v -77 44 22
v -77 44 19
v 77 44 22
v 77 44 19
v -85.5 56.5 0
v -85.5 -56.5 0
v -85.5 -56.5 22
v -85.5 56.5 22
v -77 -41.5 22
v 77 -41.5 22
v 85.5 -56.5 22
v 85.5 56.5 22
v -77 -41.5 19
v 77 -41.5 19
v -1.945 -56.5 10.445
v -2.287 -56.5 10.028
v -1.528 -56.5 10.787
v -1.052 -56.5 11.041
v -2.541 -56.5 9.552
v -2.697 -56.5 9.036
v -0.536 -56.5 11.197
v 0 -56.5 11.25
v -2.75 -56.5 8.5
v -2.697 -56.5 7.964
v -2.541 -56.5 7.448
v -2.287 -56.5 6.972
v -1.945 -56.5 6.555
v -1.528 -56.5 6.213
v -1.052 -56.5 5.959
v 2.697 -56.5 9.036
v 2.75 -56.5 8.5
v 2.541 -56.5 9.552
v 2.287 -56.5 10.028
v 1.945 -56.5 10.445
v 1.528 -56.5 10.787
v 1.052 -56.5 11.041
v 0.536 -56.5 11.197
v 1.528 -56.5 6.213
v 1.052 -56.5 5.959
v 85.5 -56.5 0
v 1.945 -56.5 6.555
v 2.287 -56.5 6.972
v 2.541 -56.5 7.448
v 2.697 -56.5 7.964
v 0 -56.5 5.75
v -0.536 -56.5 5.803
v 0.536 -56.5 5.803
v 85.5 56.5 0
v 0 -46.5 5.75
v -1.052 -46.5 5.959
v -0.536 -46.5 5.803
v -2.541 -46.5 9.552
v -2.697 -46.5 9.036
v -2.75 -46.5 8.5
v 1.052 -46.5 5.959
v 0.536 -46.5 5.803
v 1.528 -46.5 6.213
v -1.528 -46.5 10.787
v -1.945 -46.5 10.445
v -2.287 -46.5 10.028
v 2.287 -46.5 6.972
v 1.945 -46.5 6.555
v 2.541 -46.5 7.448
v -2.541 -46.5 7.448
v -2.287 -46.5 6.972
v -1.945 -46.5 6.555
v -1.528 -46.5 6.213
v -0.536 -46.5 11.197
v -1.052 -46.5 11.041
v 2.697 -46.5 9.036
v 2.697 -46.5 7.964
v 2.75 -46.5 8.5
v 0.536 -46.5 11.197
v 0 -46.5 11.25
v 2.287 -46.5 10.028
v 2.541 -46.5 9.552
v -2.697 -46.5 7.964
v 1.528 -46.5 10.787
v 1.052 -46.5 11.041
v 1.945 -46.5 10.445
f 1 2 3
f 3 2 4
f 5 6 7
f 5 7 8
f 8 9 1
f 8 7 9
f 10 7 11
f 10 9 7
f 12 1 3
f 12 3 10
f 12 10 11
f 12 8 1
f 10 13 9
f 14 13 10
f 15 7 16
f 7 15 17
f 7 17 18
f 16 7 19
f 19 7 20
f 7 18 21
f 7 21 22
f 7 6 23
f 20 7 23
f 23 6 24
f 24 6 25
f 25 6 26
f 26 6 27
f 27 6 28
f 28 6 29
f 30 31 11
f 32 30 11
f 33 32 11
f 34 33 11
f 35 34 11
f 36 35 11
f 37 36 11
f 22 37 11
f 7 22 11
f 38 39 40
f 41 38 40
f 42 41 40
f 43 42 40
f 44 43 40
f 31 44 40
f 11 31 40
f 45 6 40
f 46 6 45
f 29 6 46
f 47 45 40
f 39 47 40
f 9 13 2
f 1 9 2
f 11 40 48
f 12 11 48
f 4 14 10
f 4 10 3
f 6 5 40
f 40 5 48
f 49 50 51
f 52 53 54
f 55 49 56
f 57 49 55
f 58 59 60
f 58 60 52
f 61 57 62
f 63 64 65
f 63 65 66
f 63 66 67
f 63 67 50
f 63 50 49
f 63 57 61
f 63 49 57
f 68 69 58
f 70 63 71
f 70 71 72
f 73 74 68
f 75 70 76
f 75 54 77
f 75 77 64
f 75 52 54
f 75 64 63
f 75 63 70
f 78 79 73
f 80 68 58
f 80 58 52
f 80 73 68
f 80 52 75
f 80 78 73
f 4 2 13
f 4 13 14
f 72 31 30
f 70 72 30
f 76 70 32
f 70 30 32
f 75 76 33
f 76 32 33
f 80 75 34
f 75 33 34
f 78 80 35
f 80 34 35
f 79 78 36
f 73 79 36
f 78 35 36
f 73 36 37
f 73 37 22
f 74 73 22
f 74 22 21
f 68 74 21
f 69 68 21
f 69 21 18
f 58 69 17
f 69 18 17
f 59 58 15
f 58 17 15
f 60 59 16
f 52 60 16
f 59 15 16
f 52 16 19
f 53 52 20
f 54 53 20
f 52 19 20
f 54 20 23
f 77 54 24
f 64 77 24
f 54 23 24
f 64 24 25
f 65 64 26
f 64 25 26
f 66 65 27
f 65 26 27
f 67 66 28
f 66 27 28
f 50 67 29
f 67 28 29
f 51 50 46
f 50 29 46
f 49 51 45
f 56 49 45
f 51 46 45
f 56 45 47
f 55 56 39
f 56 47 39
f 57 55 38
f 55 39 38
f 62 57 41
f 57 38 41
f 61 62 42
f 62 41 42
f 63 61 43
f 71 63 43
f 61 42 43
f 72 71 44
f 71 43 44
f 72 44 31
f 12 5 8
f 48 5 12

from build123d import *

# Parameters (mm, degrees)
SKETCH1_W          = 171
SKETCH1_H          = 113
EXTRUDE1_DEPTH     = 22
EXTRUDE2_START     = -3
EXTRUDE2_OUTLINE_W = 154
EXTRUDE2_OUTLINE_H = 85.5
EXTRUDE2_DEPTH     = 3
SKETCH3_R          = 2.75
EXTRUDE3_DEPTH     = 10


# Read off the part's stored shape, not the designer's step: Extrude2
with BuildPart() as part:
    # Sketch1 → Extrude1 (new body)
    with BuildSketch(Plane.XY):
        Rectangle(SKETCH1_W, SKETCH1_H)
    extrude(amount=EXTRUDE1_DEPTH)

    # Extrude2 outline → Extrude2 (cut)
    with BuildSketch(Plane.XY.offset(22).offset(EXTRUDE2_START)):
        with Locations((0, 1.25)):
            Rectangle(EXTRUDE2_OUTLINE_W, EXTRUDE2_OUTLINE_H)
    extrude(amount=EXTRUDE2_DEPTH, mode=Mode.SUBTRACT)

    # Sketch3 → Extrude3 (cut)
    with BuildSketch(Plane.XZ.offset(56.5)):
        with Locations((0, 8.5)):
            Circle(SKETCH3_R)
    extrude(amount=-EXTRUDE3_DEPTH, mode=Mode.SUBTRACT)


solid = part.part
